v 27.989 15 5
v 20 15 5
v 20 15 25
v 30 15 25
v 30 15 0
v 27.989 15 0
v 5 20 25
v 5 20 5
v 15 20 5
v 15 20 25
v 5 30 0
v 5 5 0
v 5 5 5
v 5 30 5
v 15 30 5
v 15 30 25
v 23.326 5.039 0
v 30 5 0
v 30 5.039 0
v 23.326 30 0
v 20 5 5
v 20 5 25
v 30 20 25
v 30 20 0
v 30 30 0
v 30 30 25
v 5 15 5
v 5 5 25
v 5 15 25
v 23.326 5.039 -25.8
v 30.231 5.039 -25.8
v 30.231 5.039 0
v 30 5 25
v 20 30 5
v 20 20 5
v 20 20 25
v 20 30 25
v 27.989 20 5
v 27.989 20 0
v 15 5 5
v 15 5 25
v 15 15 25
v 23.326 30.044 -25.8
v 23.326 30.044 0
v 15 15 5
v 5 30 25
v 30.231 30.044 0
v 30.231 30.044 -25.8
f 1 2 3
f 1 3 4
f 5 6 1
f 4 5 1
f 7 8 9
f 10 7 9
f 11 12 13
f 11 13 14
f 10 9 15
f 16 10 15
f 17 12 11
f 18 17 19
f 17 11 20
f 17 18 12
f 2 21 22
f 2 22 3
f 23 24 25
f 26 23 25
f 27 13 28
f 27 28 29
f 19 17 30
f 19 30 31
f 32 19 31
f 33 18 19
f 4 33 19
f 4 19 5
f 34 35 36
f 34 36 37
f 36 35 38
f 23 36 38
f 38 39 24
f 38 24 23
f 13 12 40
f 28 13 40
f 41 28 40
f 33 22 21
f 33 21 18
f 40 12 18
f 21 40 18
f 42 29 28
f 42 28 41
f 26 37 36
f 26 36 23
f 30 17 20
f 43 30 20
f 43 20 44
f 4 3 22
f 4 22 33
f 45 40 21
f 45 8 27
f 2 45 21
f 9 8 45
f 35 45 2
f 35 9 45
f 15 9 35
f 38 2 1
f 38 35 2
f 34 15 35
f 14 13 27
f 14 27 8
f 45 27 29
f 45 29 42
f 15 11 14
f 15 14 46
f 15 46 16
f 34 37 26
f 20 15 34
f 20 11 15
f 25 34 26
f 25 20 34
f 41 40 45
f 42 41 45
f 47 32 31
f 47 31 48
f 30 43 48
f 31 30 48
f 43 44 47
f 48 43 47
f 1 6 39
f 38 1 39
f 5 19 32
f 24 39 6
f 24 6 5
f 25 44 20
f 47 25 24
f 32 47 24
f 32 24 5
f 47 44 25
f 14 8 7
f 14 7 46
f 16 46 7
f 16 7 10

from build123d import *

# Parameters (mm, degrees)
F0_W     = 10
F0_H     = 10
F1_DEPTH = 25
F2_W     = 22.988717
F2_H     = 25
F3_DEPTH = 5
F4_W     = 6.904623
F4_H     = 25.005924
F5_DEPTH = 25.8


with BuildPart() as f1:
    # F0 (on Top) → F1 (new body)
    with BuildSketch(Plane.XY):
        with Locations((10, 25)):
            Rectangle(F0_W, F0_H)
        with Locations((25, 25)):
            Rectangle(F0_W, F0_H)
        with Locations((25, 10)):
            Rectangle(F0_W, F0_H)
        with Locations((10, 10)):
            Rectangle(F0_W, F0_H)
    extrude(amount=F1_DEPTH)

    # F2 (on Top) → F3 (join)
    with BuildSketch(Plane.XY):
        with Locations((16.494358, 17.5)):
            Rectangle(F2_W, F2_H)
    extrude(amount=F3_DEPTH)

    # F4 (on Top) → F5 (join)
    with BuildSketch(Plane.XY):
        with Locations((26.778734, 17.541469)):
            Rectangle(F4_W, F4_H)
    extrude(amount=-F5_DEPTH)


solid = f1.part
